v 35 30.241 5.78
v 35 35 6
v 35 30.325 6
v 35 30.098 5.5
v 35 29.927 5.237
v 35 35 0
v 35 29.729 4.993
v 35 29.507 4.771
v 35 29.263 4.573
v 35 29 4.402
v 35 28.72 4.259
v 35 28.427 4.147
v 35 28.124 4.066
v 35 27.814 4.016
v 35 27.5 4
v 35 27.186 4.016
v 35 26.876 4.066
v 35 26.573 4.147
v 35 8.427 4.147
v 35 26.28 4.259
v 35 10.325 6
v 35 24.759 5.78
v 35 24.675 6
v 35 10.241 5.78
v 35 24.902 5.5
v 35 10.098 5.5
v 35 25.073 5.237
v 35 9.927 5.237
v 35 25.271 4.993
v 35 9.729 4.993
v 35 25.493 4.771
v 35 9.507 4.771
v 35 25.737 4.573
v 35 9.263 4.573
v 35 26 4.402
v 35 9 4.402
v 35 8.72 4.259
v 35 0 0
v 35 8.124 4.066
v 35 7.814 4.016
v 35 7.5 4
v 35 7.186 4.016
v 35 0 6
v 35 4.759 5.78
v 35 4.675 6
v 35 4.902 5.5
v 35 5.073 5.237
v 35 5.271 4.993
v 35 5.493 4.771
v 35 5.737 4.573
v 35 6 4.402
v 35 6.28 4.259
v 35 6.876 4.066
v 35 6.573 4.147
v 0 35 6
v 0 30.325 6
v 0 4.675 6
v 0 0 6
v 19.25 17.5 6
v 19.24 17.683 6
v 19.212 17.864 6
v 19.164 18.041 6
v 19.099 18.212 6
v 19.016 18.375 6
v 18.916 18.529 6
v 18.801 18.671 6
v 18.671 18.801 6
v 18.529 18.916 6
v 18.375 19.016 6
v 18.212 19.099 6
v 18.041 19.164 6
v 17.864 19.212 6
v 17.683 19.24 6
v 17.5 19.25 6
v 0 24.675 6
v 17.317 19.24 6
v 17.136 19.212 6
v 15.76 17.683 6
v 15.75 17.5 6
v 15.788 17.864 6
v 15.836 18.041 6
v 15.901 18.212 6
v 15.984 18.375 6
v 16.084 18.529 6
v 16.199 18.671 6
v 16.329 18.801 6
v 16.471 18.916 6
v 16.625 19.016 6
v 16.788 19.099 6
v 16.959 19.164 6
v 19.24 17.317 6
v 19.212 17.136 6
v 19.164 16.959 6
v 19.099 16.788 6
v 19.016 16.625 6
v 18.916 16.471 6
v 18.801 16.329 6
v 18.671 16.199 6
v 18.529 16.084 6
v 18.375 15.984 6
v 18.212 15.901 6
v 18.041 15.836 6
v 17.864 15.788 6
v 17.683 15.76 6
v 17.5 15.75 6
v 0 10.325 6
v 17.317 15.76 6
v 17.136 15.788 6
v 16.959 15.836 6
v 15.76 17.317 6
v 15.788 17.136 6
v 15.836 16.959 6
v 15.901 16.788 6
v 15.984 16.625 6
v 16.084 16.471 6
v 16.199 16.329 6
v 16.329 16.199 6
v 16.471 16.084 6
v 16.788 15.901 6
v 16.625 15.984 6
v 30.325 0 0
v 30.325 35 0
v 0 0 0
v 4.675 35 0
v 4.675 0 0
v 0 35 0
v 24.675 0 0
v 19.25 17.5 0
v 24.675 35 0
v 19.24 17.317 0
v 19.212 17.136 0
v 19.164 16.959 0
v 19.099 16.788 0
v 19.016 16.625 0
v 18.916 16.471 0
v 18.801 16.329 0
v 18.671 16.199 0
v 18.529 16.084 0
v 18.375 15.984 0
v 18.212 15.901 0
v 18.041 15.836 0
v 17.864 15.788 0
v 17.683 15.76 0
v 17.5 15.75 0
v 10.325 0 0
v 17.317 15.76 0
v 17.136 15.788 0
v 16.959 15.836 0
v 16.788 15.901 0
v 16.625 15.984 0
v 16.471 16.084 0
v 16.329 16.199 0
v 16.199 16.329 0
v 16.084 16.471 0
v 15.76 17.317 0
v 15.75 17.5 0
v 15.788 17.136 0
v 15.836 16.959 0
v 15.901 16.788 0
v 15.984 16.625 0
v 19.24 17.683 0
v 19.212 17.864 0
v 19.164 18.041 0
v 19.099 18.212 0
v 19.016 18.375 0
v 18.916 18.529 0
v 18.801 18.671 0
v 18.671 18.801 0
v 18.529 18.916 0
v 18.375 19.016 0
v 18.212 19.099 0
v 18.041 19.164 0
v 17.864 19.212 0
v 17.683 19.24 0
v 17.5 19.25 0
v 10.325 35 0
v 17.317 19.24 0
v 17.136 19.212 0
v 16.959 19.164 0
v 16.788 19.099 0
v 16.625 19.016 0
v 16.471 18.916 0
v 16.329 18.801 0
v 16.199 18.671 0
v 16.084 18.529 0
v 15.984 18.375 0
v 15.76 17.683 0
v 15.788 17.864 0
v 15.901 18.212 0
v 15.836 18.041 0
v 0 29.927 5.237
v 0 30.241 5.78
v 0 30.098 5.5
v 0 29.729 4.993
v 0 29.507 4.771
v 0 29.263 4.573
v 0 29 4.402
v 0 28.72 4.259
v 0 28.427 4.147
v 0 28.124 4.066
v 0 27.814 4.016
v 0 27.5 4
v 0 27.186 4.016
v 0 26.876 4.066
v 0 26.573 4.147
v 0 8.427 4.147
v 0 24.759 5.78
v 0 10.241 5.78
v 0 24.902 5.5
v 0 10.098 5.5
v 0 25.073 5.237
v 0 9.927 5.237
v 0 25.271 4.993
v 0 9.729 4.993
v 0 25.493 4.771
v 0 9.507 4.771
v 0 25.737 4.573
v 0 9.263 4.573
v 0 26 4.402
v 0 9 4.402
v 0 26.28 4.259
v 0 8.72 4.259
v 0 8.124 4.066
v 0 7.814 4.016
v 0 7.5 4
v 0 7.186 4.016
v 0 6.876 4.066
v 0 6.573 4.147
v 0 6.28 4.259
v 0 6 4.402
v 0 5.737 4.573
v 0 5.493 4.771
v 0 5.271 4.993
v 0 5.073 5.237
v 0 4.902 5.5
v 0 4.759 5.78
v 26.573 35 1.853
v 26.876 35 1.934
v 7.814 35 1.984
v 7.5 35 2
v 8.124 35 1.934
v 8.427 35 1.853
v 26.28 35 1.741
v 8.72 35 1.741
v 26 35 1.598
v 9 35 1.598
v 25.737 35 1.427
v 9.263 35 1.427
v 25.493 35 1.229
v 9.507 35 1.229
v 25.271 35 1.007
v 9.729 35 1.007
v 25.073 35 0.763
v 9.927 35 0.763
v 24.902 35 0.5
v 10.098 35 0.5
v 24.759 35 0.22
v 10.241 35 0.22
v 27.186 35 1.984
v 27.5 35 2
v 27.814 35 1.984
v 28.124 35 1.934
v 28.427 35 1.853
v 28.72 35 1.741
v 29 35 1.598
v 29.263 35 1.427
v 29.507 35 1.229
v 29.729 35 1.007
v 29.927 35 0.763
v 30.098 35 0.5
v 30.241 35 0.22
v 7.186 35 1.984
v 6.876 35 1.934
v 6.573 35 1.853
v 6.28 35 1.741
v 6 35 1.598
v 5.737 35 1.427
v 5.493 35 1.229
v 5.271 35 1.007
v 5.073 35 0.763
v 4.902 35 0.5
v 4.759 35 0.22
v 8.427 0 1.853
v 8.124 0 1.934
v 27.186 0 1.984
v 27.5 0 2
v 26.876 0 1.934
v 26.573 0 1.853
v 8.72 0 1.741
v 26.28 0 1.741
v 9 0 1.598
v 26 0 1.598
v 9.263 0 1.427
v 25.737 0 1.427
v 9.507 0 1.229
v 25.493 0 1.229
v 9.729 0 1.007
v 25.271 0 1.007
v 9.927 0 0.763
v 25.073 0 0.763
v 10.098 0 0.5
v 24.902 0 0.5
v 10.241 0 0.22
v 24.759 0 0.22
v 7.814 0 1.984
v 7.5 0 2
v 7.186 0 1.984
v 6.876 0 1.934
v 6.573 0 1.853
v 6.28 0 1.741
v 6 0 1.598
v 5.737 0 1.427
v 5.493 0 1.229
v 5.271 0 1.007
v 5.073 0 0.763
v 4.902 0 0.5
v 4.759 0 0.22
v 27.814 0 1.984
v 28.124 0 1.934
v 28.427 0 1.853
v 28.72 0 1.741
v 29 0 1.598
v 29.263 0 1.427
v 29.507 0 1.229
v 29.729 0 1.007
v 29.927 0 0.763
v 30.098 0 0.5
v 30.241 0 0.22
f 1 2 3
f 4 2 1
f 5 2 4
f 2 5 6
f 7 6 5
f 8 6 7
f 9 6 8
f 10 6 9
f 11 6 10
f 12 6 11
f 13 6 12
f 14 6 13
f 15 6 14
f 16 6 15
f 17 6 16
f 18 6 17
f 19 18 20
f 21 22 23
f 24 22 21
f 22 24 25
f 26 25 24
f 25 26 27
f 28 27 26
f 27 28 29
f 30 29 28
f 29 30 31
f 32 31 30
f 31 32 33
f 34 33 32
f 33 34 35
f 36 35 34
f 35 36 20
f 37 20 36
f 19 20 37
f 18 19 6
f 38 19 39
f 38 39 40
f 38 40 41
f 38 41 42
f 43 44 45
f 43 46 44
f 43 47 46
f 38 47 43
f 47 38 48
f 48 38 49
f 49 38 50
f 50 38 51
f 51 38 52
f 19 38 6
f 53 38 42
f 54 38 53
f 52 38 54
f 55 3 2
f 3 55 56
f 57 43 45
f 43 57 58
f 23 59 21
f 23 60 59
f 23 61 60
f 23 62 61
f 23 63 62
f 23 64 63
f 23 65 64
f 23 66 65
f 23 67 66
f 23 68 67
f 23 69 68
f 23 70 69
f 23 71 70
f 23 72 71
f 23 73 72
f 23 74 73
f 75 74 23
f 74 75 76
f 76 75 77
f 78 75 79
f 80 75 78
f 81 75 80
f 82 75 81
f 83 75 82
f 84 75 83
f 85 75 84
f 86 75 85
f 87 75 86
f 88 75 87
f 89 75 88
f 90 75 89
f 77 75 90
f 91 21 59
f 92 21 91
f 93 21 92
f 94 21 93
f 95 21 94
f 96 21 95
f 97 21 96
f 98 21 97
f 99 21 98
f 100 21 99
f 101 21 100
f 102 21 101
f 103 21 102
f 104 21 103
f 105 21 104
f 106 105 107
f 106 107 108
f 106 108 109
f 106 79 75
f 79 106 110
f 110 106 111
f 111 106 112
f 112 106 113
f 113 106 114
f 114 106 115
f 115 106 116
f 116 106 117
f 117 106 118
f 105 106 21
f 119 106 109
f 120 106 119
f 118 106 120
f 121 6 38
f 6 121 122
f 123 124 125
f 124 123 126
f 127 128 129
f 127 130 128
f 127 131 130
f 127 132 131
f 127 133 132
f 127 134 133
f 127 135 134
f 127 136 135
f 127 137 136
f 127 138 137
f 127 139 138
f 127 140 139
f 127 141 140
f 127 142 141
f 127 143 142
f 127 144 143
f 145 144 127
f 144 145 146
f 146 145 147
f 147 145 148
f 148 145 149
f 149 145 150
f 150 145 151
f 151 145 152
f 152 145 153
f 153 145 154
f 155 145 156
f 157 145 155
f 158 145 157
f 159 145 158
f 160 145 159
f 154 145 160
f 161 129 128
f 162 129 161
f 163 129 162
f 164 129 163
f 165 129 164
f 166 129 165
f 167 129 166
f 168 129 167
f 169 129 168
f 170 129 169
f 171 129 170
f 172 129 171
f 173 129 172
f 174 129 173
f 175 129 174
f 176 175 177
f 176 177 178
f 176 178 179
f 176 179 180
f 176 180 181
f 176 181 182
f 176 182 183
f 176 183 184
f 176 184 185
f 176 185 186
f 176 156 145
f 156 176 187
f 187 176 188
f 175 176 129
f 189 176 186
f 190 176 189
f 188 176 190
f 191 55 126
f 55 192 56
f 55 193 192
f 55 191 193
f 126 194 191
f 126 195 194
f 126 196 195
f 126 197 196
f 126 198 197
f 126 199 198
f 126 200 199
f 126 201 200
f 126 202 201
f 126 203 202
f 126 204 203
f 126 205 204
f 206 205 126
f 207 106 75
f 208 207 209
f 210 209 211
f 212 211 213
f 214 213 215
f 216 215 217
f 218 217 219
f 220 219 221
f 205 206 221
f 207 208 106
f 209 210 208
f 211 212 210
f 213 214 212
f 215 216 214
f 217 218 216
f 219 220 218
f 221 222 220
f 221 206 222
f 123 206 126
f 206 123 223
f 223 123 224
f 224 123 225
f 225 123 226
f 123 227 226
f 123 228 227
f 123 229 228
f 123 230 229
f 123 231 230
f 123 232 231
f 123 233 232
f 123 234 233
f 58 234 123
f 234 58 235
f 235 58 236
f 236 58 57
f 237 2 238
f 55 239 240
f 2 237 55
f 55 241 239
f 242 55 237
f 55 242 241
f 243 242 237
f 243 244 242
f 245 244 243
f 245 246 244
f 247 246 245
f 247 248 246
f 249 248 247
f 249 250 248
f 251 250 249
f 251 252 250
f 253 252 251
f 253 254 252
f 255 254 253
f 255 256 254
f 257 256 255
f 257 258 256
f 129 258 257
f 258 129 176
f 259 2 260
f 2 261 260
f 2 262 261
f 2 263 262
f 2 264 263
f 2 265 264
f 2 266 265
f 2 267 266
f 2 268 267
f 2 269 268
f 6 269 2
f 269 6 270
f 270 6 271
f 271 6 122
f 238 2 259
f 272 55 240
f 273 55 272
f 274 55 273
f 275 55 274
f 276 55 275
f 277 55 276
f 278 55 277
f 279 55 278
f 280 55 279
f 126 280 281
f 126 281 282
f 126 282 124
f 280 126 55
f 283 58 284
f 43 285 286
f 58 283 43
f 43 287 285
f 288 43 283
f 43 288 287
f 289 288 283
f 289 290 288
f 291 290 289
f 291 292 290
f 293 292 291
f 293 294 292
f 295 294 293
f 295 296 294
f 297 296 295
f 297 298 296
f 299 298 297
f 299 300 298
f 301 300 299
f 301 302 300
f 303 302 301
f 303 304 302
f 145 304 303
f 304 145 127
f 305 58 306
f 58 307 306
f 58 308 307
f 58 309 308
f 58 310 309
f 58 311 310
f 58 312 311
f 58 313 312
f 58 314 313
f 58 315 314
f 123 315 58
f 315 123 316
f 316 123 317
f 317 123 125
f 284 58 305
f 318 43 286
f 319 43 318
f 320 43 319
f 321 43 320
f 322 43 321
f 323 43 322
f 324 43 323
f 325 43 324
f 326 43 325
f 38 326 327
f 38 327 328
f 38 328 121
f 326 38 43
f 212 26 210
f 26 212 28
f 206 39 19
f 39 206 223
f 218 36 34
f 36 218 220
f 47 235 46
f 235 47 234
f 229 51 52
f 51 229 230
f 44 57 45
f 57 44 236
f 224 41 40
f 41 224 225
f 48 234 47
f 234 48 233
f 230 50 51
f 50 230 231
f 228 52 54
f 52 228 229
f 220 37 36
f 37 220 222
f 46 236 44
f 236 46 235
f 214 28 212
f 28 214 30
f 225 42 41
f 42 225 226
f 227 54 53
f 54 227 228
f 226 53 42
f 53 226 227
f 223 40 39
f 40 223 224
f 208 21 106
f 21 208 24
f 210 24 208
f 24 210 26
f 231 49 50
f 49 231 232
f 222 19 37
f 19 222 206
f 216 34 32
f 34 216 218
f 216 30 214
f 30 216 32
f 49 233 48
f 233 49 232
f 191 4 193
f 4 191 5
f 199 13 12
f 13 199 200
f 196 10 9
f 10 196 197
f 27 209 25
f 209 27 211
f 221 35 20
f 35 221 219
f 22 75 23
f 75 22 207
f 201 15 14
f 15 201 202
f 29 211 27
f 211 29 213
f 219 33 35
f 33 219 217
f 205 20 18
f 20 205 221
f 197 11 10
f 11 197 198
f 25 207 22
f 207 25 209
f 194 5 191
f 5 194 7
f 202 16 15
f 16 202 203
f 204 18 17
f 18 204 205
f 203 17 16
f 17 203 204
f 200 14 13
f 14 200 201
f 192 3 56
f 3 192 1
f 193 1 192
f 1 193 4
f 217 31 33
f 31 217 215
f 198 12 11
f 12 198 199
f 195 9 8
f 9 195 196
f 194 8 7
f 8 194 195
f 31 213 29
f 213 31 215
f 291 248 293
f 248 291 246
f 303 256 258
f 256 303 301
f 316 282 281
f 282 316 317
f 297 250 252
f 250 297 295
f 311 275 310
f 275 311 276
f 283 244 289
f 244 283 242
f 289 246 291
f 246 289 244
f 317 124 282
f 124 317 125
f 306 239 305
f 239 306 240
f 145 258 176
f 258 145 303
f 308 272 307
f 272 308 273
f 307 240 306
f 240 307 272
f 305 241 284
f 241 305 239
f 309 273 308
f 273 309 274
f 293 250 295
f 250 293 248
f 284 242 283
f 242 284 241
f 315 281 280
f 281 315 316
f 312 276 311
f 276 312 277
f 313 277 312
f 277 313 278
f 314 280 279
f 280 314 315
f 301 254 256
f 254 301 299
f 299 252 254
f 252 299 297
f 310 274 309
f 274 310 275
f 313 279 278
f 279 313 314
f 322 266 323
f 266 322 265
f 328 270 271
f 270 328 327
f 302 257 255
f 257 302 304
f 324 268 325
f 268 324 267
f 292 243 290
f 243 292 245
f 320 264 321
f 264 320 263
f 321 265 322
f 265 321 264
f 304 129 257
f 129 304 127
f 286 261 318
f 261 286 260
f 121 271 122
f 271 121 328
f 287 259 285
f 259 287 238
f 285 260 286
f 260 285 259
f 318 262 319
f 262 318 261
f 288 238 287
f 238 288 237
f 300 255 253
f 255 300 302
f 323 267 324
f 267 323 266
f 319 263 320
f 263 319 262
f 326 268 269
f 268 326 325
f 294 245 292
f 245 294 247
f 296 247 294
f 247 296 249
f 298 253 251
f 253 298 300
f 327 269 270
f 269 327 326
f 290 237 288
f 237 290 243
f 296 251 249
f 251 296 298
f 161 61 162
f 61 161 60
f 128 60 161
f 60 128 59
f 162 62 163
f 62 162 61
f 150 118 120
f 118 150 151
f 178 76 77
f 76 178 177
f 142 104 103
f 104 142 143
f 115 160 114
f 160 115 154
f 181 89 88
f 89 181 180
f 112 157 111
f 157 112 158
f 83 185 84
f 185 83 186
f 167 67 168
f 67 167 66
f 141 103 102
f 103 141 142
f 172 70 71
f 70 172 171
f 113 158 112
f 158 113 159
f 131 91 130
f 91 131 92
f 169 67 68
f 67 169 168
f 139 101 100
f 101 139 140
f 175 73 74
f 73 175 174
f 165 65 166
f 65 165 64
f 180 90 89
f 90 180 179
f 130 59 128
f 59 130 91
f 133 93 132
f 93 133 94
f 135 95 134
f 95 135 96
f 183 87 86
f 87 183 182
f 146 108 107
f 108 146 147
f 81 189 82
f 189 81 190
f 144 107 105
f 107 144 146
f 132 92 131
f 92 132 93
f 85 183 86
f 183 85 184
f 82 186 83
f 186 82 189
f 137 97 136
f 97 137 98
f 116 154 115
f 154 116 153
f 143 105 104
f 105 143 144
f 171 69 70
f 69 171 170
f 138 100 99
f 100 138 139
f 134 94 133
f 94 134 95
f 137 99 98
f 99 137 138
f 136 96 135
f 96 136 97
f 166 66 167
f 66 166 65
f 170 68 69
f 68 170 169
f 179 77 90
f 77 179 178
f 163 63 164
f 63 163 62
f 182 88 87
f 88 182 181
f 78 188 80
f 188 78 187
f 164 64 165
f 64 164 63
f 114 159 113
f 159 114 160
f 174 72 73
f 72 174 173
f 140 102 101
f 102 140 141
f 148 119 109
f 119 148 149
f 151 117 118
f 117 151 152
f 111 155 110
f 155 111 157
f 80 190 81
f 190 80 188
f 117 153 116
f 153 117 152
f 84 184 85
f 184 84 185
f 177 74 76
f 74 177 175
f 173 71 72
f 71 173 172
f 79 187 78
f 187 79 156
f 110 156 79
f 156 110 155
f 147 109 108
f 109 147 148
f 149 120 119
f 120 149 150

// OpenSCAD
$fn = 60;
b = 35;

cylin = 6;
dist = 20;
delta = 2;
h = 2*cylin+5*delta;

kreuz();
module top()
{
  difference()
  {
    cube([b,b,6]);
    translate([-1,(b-dist)/2,7]) rotate([0,90,0])cylinder(50,cylin/2,cylin/2);
    translate([-1,(b-dist)/2+dist,7]) rotate([0,90,0])cylinder(50,cylin/2,cylin/2);
    translate([b/2,b/2,-1])  cylinder(30,3.5/2,3.5/2);
    //tanslate([b/2,b/2,-1])  cylinder(3,7.5/2,3.5/2);
    translate([b/2,b/2,-1])  cone(4);
  }  
}

module bottom()
{
  difference()
  {
    cube([b,b,6]);
    translate([-1,(b-dist)/2,7]) rotate([0,90,0])cylinder(50,cylin/2,cylin/2);
    translate([-1,(b-dist)/2+dist,7]) rotate([0,90,0])cylinder(50,cylin/2,cylin/2);
    translate([b/2,b/2,-1])  cylinder(30,3.5/2,3.5/2);
    translate([b/2,b/2,-1]) nut(SW = 5.8, H = 4.5);
  }  
}

kreuz();

module kreuz()
{
  difference()
  {
    cube([b,b,cylin]);
    translate([-1,(b-dist)/2,cylin+delta/2]) rotate([0,90,0])cylinder(50,cylin/2,cylin/2);
    translate([-1,(b-dist)/2+dist,cylin+delta/2]) rotate([0,90,0])cylinder(50,cylin/2,cylin/2);
    
    translate([(b-dist)/2, -1,-delta/2]) rotate([-90,0,0])cylinder(50,cylin/2,cylin/2);
    translate([(b-dist)/2+dist,-1,-delta/2]) rotate([-90,0,0])cylinder(50,cylin/2,cylin/2);
    translate([b/2,b/2,-1])  cylinder(30,3.5/2,3.5/2);
  }  
}


module nut(SW = 5, H = 5)
{
  cylinder(r = SW/(2*cos(30)),h = H, $fn=6);
}  

module cone (h = 5, Angle = 90)
{
  cylinder(h, h,0, $fn=60);
}  
